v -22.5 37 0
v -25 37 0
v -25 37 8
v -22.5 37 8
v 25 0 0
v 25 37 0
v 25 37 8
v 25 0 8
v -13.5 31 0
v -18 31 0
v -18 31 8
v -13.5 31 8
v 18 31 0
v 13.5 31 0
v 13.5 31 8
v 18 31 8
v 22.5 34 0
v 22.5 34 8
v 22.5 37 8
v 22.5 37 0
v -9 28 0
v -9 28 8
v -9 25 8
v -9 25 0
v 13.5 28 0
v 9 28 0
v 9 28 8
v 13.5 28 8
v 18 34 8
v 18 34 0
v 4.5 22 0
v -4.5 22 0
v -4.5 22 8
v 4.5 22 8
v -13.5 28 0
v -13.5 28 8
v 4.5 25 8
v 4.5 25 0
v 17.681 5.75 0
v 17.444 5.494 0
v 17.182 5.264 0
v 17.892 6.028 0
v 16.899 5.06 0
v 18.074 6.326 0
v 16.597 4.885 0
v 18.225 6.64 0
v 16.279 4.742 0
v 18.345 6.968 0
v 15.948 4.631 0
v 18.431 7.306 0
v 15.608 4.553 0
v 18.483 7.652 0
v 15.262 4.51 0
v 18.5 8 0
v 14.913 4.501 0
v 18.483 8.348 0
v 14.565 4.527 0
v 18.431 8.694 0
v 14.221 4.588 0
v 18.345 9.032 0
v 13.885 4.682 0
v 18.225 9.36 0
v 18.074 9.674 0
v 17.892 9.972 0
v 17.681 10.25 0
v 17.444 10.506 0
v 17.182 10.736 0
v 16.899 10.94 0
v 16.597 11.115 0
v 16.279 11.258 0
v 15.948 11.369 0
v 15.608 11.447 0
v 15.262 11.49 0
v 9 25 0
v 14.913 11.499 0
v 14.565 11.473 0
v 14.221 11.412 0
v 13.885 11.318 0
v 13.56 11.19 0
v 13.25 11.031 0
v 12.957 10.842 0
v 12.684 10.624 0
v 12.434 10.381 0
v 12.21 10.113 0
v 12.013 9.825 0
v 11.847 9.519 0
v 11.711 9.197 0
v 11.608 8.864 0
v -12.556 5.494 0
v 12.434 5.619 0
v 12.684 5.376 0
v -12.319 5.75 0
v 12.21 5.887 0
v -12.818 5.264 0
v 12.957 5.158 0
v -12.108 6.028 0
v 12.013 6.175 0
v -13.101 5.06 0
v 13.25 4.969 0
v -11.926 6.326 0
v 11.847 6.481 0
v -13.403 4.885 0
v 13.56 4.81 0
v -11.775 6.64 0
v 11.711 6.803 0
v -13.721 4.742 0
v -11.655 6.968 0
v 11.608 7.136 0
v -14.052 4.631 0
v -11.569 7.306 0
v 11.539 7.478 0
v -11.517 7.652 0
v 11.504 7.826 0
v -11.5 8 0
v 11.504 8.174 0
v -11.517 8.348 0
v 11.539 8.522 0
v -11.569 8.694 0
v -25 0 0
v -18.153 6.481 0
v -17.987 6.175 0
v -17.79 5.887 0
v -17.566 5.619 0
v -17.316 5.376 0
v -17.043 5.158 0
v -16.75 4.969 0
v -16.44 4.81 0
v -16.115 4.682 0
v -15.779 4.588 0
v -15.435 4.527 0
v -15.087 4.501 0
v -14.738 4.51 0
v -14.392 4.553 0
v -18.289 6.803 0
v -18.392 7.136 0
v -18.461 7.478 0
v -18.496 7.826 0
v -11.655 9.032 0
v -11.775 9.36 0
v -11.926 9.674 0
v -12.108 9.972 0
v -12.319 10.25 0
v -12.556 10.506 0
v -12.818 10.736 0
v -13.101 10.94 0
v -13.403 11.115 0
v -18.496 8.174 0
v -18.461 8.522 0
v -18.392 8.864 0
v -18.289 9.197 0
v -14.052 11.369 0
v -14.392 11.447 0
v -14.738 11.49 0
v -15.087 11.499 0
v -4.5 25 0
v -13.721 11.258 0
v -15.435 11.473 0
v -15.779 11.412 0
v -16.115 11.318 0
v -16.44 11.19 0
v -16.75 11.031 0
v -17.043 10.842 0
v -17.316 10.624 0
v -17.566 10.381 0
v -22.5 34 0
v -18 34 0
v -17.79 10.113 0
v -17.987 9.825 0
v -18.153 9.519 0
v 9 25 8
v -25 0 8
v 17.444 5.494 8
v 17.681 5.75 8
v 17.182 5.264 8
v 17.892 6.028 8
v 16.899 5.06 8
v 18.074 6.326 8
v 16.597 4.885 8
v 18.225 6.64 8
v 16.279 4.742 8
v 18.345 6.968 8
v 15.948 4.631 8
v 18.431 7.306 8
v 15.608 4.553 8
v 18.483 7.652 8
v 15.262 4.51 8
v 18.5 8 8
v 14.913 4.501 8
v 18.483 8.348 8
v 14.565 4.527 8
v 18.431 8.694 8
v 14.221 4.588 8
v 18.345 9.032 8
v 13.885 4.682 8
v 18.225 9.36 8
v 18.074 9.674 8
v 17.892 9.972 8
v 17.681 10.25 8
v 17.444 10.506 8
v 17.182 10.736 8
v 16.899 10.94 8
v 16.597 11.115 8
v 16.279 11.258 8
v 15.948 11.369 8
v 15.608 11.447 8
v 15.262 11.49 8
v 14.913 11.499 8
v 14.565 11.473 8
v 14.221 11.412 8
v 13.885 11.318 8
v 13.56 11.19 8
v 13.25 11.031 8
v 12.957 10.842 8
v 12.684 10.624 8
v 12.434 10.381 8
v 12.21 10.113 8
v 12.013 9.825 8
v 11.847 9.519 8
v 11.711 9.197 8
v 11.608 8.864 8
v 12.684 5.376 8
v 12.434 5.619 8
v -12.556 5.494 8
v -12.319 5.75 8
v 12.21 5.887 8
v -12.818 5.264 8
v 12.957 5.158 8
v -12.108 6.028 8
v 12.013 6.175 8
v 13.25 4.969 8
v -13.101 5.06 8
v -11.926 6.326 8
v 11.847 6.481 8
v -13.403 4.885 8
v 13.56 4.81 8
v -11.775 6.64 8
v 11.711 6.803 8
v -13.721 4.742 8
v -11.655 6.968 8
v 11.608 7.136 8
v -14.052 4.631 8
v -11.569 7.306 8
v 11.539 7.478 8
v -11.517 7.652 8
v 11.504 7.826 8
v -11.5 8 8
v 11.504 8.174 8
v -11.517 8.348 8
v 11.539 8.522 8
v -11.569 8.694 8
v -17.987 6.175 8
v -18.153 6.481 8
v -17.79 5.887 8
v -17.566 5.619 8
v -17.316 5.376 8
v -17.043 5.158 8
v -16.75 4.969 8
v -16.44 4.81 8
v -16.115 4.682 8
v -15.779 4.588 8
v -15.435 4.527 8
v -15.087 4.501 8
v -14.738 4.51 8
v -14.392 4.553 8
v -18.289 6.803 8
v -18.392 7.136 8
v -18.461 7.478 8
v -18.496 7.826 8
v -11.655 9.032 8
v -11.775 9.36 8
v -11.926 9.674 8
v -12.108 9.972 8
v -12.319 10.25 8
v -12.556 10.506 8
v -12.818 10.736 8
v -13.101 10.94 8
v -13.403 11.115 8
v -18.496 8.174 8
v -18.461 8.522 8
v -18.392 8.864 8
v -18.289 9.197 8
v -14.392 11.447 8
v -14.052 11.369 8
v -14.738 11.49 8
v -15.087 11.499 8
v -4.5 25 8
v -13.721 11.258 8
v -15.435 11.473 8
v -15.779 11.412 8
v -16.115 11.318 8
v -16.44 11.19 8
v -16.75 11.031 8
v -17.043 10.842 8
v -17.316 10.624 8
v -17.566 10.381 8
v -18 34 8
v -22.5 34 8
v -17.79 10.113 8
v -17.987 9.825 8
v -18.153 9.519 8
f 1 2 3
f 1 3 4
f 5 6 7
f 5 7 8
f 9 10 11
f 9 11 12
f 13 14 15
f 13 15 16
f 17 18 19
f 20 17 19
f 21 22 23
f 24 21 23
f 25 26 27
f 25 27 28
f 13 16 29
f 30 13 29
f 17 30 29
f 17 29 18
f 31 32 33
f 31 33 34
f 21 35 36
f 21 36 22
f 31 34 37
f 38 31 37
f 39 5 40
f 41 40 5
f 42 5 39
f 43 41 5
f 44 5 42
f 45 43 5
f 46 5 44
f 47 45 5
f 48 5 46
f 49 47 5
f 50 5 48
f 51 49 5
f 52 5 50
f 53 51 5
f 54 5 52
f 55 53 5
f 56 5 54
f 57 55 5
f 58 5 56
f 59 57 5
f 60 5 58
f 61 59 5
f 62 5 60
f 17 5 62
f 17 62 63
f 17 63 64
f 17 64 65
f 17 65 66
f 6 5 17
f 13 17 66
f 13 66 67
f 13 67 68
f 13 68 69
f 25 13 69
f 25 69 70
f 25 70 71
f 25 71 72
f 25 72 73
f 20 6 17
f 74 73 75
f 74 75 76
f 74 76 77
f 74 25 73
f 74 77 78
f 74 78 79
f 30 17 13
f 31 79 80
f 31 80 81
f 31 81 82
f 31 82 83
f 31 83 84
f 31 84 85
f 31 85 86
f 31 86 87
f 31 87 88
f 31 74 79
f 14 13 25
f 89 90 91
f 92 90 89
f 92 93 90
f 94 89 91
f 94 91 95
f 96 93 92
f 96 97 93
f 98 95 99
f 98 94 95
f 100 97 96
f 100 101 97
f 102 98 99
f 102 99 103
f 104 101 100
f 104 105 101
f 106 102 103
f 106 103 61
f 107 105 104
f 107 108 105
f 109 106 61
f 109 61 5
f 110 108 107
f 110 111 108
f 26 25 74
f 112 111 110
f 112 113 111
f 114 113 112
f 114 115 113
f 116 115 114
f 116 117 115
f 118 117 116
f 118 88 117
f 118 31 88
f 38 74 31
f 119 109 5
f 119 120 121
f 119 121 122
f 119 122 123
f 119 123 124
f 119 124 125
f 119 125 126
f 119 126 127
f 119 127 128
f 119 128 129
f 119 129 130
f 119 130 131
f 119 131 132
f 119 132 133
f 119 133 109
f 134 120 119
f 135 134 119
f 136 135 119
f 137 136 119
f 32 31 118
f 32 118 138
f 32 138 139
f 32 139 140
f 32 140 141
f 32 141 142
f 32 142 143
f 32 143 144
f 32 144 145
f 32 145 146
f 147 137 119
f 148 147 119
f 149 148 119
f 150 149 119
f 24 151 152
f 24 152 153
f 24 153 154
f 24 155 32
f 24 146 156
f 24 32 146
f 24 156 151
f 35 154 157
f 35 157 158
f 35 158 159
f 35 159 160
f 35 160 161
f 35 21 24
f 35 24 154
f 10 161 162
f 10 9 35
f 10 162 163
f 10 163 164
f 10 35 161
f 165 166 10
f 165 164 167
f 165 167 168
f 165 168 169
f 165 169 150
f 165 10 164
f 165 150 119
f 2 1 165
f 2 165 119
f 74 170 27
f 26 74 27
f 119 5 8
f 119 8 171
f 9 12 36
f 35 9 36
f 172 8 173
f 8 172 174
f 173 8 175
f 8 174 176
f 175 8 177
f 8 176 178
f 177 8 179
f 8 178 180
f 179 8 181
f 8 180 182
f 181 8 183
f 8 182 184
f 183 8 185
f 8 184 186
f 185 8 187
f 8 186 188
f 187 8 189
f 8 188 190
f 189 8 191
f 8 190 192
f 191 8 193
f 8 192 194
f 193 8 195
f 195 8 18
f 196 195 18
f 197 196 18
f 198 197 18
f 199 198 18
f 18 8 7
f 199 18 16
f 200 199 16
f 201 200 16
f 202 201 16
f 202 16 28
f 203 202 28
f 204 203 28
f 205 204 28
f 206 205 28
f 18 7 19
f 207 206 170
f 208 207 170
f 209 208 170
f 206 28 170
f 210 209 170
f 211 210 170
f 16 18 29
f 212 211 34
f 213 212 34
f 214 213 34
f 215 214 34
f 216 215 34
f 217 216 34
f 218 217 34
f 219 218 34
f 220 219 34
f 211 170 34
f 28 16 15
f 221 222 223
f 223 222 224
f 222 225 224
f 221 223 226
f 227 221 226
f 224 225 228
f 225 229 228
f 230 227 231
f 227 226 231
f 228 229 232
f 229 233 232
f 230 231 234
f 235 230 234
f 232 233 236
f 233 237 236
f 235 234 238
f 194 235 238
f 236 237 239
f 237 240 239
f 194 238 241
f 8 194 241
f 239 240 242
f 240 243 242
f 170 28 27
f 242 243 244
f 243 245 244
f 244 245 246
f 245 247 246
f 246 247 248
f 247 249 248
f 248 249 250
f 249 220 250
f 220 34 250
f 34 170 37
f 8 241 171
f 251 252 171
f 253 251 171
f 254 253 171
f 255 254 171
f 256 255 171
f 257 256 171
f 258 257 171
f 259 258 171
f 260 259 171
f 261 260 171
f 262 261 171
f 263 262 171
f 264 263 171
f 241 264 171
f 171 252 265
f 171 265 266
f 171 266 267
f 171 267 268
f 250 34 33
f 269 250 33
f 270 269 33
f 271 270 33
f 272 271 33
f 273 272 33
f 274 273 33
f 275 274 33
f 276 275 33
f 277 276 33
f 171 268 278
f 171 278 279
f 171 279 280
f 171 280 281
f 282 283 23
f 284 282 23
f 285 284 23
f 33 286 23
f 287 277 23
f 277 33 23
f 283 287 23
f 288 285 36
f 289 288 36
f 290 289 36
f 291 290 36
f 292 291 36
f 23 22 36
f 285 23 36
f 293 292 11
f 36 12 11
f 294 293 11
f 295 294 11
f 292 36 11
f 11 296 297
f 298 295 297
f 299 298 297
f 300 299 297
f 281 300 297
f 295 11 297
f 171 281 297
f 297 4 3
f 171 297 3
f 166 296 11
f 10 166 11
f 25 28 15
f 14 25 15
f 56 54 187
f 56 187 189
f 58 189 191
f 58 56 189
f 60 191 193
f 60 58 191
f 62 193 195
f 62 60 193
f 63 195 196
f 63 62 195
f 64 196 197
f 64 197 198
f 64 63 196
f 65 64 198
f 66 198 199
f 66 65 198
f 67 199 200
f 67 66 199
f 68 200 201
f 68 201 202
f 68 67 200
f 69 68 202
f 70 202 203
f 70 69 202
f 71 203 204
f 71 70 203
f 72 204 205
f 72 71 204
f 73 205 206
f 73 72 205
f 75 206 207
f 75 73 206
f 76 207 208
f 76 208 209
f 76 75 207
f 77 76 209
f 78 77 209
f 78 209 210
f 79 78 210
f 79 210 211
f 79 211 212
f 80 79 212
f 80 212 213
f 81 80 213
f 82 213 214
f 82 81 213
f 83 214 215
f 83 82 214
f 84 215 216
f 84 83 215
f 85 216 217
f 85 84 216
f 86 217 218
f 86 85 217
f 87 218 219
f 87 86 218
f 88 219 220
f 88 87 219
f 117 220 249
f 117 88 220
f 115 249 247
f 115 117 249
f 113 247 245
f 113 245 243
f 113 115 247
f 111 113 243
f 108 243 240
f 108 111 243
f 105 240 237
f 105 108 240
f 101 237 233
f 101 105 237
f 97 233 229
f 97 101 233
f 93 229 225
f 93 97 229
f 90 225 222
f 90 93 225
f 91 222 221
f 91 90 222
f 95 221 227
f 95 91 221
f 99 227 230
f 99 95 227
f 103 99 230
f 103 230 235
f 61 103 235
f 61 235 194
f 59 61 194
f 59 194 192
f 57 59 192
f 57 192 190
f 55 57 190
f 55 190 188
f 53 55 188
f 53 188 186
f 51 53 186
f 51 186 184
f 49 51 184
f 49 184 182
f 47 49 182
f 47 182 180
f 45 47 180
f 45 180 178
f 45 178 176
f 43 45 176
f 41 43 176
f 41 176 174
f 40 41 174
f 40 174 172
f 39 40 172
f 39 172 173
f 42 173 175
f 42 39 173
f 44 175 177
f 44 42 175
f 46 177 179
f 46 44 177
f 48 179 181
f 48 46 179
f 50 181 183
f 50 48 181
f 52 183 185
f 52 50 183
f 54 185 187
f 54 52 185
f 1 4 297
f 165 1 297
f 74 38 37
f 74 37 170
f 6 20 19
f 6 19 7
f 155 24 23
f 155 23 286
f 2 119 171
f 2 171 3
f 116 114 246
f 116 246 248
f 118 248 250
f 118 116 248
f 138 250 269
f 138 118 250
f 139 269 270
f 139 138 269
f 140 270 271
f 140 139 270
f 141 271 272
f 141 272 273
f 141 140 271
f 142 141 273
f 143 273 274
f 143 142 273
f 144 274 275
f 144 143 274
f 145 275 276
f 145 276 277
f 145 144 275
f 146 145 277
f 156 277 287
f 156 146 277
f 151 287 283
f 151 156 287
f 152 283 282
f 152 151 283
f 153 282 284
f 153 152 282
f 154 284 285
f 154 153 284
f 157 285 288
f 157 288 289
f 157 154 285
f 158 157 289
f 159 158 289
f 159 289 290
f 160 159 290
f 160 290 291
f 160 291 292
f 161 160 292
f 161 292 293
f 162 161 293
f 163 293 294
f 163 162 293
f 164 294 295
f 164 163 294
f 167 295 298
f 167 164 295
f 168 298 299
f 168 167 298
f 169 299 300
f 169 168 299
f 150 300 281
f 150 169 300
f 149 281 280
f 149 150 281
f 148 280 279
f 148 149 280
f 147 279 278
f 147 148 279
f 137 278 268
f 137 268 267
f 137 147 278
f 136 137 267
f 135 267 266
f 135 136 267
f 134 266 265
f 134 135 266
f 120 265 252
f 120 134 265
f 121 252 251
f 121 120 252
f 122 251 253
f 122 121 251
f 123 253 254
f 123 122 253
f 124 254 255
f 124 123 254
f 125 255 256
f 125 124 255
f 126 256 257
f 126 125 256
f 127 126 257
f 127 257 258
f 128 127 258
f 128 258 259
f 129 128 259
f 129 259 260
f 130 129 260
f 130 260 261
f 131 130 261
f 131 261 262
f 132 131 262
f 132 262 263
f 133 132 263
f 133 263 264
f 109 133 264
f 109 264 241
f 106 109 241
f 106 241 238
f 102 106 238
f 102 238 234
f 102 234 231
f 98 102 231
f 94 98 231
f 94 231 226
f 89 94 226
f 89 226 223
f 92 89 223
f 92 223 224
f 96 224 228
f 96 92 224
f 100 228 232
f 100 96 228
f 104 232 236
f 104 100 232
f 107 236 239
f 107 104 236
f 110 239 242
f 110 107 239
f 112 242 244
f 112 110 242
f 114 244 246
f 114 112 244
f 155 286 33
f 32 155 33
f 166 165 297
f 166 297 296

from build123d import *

# Parameters (mm, degrees)
SKETCH1_R           = 3.5
BOSS_EXTRUDE1_DEPTH = 8


with BuildPart() as part:
    # Sketch1 → Boss-Extrude1 (new body)
    with BuildSketch(Plane.XY):
        Polygon((25, 0), (-25, 0), (-25, 37), (-22.5, 37), (-22.5, 34), (-18, 34), (-18, 31), (-13.5, 31), (-13.5, 28), (-9, 28), (-9, 25), (-4.5, 25), (-4.5, 22), (4.5, 22), (4.5, 25), (9, 25), (9, 28), (13.5, 28), (13.5, 31), (18, 31), (18, 34), (22.5, 34), (22.5, 37), (25, 37), align=None)
        with Locations((-15, 8)):
            Circle(SKETCH1_R, mode=Mode.SUBTRACT)
        with Locations((15, 8)):
            Circle(SKETCH1_R, mode=Mode.SUBTRACT)
    extrude(amount=BOSS_EXTRUDE1_DEPTH)


solid = part.part
